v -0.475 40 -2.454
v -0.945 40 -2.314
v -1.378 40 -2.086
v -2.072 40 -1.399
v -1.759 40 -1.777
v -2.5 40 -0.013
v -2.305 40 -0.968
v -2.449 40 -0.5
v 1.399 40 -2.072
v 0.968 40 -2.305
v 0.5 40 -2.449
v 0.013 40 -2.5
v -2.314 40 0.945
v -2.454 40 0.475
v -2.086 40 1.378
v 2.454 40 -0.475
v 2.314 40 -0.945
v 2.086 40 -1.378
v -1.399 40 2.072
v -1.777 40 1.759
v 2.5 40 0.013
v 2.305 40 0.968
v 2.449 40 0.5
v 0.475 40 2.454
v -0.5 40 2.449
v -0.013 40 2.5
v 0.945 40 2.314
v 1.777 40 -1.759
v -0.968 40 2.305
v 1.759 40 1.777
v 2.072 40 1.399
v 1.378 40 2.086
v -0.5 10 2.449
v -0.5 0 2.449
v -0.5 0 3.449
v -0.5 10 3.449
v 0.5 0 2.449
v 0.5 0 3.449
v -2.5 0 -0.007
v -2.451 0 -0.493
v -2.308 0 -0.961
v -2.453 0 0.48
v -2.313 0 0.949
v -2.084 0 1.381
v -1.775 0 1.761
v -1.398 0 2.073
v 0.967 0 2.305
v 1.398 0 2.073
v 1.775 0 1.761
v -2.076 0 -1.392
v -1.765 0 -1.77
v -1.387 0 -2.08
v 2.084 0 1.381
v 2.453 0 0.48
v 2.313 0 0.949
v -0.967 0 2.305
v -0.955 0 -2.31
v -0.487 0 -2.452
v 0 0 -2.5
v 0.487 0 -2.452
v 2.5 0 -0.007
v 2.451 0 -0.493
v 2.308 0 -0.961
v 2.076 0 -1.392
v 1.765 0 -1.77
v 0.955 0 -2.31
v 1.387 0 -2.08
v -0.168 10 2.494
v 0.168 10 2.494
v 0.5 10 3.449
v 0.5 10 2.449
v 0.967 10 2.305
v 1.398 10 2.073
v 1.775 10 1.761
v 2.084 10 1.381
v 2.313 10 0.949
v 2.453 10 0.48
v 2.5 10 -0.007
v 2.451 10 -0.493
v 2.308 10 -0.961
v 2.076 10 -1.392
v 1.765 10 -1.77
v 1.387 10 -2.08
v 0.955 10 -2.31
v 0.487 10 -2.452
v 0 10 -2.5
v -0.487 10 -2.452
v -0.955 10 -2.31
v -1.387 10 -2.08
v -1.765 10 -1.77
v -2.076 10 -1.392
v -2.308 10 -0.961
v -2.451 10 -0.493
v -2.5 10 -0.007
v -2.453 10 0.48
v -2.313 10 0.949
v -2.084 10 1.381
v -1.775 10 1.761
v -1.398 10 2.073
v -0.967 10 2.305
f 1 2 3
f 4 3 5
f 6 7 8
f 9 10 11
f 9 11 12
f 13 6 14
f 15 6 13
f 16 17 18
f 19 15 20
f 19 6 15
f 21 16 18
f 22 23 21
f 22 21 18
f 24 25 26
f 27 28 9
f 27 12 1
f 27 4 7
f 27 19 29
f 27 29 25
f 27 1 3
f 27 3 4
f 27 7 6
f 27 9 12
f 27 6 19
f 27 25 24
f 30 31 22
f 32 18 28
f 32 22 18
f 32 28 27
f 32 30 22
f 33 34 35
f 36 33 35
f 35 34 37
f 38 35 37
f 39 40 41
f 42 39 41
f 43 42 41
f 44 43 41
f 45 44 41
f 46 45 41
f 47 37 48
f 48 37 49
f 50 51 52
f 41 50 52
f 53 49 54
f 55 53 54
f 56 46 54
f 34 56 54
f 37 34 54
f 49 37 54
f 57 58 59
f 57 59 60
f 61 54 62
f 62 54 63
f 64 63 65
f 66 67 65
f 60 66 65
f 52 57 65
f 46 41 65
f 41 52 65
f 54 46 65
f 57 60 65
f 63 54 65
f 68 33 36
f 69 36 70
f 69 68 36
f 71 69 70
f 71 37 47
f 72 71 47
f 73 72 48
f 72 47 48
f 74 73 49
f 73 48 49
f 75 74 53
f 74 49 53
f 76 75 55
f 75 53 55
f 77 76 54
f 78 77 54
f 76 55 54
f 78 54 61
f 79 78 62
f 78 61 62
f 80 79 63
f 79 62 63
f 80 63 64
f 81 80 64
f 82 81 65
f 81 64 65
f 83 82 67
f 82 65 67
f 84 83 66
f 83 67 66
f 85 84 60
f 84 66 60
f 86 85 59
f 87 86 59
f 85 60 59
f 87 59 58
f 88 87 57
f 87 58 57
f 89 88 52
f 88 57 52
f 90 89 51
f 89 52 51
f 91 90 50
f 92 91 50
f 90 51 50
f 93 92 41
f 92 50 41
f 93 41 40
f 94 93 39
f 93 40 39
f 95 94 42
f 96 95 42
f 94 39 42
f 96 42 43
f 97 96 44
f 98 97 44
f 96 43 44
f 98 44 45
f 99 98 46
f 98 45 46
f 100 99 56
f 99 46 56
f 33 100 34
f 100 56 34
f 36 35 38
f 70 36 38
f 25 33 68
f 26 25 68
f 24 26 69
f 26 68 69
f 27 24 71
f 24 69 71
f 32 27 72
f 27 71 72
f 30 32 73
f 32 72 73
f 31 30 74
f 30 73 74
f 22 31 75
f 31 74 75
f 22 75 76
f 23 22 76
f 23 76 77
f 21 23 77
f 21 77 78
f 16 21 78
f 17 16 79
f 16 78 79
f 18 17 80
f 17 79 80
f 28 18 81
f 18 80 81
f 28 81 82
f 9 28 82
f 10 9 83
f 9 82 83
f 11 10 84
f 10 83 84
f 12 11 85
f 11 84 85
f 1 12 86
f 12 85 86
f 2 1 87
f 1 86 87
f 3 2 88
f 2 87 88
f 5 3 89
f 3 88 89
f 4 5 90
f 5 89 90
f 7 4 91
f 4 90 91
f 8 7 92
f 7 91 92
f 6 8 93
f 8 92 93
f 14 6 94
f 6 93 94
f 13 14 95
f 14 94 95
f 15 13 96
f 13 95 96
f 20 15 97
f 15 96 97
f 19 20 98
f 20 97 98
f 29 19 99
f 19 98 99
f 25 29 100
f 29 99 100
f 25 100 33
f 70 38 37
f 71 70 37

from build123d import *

# Parameters (mm, degrees)
BOSS_EXTRUDE1_DEPTH = 10
SKETCH2_R           = 2.5
BOSS_EXTRUDE2_DEPTH = 30


with BuildPart() as part:
    # Sketch1 → Boss-Extrude1 (new body)
    with BuildSketch(Plane(origin=(0, 0, 0), x_dir=(1, 0, 0), z_dir=(0, 1, 0))):
        with BuildLine():
            Line((-0.5, -2.449489743), (-0.5, -3.449489743))
            Line((-0.5, -3.449489743), (0.5, -3.449489743))
            Line((0.5, -3.449489743), (0.5, -2.449489743))
            ThreePointArc((0.5, -2.449489743), (0, 2.5), (-0.5, -2.449489743))
        make_face()
    extrude(amount=BOSS_EXTRUDE1_DEPTH)

    # Sketch2 → Boss-Extrude2 (add)
    with BuildSketch(Plane(origin=(0, 10, 0), x_dir=(1, 0, 0), z_dir=(0, 1, 0))):
        with Locations(Location((0, 0, 0), (0, 0, 258.463040967))):
            Circle(SKETCH2_R)
    extrude(amount=BOSS_EXTRUDE2_DEPTH)


solid = part.part
